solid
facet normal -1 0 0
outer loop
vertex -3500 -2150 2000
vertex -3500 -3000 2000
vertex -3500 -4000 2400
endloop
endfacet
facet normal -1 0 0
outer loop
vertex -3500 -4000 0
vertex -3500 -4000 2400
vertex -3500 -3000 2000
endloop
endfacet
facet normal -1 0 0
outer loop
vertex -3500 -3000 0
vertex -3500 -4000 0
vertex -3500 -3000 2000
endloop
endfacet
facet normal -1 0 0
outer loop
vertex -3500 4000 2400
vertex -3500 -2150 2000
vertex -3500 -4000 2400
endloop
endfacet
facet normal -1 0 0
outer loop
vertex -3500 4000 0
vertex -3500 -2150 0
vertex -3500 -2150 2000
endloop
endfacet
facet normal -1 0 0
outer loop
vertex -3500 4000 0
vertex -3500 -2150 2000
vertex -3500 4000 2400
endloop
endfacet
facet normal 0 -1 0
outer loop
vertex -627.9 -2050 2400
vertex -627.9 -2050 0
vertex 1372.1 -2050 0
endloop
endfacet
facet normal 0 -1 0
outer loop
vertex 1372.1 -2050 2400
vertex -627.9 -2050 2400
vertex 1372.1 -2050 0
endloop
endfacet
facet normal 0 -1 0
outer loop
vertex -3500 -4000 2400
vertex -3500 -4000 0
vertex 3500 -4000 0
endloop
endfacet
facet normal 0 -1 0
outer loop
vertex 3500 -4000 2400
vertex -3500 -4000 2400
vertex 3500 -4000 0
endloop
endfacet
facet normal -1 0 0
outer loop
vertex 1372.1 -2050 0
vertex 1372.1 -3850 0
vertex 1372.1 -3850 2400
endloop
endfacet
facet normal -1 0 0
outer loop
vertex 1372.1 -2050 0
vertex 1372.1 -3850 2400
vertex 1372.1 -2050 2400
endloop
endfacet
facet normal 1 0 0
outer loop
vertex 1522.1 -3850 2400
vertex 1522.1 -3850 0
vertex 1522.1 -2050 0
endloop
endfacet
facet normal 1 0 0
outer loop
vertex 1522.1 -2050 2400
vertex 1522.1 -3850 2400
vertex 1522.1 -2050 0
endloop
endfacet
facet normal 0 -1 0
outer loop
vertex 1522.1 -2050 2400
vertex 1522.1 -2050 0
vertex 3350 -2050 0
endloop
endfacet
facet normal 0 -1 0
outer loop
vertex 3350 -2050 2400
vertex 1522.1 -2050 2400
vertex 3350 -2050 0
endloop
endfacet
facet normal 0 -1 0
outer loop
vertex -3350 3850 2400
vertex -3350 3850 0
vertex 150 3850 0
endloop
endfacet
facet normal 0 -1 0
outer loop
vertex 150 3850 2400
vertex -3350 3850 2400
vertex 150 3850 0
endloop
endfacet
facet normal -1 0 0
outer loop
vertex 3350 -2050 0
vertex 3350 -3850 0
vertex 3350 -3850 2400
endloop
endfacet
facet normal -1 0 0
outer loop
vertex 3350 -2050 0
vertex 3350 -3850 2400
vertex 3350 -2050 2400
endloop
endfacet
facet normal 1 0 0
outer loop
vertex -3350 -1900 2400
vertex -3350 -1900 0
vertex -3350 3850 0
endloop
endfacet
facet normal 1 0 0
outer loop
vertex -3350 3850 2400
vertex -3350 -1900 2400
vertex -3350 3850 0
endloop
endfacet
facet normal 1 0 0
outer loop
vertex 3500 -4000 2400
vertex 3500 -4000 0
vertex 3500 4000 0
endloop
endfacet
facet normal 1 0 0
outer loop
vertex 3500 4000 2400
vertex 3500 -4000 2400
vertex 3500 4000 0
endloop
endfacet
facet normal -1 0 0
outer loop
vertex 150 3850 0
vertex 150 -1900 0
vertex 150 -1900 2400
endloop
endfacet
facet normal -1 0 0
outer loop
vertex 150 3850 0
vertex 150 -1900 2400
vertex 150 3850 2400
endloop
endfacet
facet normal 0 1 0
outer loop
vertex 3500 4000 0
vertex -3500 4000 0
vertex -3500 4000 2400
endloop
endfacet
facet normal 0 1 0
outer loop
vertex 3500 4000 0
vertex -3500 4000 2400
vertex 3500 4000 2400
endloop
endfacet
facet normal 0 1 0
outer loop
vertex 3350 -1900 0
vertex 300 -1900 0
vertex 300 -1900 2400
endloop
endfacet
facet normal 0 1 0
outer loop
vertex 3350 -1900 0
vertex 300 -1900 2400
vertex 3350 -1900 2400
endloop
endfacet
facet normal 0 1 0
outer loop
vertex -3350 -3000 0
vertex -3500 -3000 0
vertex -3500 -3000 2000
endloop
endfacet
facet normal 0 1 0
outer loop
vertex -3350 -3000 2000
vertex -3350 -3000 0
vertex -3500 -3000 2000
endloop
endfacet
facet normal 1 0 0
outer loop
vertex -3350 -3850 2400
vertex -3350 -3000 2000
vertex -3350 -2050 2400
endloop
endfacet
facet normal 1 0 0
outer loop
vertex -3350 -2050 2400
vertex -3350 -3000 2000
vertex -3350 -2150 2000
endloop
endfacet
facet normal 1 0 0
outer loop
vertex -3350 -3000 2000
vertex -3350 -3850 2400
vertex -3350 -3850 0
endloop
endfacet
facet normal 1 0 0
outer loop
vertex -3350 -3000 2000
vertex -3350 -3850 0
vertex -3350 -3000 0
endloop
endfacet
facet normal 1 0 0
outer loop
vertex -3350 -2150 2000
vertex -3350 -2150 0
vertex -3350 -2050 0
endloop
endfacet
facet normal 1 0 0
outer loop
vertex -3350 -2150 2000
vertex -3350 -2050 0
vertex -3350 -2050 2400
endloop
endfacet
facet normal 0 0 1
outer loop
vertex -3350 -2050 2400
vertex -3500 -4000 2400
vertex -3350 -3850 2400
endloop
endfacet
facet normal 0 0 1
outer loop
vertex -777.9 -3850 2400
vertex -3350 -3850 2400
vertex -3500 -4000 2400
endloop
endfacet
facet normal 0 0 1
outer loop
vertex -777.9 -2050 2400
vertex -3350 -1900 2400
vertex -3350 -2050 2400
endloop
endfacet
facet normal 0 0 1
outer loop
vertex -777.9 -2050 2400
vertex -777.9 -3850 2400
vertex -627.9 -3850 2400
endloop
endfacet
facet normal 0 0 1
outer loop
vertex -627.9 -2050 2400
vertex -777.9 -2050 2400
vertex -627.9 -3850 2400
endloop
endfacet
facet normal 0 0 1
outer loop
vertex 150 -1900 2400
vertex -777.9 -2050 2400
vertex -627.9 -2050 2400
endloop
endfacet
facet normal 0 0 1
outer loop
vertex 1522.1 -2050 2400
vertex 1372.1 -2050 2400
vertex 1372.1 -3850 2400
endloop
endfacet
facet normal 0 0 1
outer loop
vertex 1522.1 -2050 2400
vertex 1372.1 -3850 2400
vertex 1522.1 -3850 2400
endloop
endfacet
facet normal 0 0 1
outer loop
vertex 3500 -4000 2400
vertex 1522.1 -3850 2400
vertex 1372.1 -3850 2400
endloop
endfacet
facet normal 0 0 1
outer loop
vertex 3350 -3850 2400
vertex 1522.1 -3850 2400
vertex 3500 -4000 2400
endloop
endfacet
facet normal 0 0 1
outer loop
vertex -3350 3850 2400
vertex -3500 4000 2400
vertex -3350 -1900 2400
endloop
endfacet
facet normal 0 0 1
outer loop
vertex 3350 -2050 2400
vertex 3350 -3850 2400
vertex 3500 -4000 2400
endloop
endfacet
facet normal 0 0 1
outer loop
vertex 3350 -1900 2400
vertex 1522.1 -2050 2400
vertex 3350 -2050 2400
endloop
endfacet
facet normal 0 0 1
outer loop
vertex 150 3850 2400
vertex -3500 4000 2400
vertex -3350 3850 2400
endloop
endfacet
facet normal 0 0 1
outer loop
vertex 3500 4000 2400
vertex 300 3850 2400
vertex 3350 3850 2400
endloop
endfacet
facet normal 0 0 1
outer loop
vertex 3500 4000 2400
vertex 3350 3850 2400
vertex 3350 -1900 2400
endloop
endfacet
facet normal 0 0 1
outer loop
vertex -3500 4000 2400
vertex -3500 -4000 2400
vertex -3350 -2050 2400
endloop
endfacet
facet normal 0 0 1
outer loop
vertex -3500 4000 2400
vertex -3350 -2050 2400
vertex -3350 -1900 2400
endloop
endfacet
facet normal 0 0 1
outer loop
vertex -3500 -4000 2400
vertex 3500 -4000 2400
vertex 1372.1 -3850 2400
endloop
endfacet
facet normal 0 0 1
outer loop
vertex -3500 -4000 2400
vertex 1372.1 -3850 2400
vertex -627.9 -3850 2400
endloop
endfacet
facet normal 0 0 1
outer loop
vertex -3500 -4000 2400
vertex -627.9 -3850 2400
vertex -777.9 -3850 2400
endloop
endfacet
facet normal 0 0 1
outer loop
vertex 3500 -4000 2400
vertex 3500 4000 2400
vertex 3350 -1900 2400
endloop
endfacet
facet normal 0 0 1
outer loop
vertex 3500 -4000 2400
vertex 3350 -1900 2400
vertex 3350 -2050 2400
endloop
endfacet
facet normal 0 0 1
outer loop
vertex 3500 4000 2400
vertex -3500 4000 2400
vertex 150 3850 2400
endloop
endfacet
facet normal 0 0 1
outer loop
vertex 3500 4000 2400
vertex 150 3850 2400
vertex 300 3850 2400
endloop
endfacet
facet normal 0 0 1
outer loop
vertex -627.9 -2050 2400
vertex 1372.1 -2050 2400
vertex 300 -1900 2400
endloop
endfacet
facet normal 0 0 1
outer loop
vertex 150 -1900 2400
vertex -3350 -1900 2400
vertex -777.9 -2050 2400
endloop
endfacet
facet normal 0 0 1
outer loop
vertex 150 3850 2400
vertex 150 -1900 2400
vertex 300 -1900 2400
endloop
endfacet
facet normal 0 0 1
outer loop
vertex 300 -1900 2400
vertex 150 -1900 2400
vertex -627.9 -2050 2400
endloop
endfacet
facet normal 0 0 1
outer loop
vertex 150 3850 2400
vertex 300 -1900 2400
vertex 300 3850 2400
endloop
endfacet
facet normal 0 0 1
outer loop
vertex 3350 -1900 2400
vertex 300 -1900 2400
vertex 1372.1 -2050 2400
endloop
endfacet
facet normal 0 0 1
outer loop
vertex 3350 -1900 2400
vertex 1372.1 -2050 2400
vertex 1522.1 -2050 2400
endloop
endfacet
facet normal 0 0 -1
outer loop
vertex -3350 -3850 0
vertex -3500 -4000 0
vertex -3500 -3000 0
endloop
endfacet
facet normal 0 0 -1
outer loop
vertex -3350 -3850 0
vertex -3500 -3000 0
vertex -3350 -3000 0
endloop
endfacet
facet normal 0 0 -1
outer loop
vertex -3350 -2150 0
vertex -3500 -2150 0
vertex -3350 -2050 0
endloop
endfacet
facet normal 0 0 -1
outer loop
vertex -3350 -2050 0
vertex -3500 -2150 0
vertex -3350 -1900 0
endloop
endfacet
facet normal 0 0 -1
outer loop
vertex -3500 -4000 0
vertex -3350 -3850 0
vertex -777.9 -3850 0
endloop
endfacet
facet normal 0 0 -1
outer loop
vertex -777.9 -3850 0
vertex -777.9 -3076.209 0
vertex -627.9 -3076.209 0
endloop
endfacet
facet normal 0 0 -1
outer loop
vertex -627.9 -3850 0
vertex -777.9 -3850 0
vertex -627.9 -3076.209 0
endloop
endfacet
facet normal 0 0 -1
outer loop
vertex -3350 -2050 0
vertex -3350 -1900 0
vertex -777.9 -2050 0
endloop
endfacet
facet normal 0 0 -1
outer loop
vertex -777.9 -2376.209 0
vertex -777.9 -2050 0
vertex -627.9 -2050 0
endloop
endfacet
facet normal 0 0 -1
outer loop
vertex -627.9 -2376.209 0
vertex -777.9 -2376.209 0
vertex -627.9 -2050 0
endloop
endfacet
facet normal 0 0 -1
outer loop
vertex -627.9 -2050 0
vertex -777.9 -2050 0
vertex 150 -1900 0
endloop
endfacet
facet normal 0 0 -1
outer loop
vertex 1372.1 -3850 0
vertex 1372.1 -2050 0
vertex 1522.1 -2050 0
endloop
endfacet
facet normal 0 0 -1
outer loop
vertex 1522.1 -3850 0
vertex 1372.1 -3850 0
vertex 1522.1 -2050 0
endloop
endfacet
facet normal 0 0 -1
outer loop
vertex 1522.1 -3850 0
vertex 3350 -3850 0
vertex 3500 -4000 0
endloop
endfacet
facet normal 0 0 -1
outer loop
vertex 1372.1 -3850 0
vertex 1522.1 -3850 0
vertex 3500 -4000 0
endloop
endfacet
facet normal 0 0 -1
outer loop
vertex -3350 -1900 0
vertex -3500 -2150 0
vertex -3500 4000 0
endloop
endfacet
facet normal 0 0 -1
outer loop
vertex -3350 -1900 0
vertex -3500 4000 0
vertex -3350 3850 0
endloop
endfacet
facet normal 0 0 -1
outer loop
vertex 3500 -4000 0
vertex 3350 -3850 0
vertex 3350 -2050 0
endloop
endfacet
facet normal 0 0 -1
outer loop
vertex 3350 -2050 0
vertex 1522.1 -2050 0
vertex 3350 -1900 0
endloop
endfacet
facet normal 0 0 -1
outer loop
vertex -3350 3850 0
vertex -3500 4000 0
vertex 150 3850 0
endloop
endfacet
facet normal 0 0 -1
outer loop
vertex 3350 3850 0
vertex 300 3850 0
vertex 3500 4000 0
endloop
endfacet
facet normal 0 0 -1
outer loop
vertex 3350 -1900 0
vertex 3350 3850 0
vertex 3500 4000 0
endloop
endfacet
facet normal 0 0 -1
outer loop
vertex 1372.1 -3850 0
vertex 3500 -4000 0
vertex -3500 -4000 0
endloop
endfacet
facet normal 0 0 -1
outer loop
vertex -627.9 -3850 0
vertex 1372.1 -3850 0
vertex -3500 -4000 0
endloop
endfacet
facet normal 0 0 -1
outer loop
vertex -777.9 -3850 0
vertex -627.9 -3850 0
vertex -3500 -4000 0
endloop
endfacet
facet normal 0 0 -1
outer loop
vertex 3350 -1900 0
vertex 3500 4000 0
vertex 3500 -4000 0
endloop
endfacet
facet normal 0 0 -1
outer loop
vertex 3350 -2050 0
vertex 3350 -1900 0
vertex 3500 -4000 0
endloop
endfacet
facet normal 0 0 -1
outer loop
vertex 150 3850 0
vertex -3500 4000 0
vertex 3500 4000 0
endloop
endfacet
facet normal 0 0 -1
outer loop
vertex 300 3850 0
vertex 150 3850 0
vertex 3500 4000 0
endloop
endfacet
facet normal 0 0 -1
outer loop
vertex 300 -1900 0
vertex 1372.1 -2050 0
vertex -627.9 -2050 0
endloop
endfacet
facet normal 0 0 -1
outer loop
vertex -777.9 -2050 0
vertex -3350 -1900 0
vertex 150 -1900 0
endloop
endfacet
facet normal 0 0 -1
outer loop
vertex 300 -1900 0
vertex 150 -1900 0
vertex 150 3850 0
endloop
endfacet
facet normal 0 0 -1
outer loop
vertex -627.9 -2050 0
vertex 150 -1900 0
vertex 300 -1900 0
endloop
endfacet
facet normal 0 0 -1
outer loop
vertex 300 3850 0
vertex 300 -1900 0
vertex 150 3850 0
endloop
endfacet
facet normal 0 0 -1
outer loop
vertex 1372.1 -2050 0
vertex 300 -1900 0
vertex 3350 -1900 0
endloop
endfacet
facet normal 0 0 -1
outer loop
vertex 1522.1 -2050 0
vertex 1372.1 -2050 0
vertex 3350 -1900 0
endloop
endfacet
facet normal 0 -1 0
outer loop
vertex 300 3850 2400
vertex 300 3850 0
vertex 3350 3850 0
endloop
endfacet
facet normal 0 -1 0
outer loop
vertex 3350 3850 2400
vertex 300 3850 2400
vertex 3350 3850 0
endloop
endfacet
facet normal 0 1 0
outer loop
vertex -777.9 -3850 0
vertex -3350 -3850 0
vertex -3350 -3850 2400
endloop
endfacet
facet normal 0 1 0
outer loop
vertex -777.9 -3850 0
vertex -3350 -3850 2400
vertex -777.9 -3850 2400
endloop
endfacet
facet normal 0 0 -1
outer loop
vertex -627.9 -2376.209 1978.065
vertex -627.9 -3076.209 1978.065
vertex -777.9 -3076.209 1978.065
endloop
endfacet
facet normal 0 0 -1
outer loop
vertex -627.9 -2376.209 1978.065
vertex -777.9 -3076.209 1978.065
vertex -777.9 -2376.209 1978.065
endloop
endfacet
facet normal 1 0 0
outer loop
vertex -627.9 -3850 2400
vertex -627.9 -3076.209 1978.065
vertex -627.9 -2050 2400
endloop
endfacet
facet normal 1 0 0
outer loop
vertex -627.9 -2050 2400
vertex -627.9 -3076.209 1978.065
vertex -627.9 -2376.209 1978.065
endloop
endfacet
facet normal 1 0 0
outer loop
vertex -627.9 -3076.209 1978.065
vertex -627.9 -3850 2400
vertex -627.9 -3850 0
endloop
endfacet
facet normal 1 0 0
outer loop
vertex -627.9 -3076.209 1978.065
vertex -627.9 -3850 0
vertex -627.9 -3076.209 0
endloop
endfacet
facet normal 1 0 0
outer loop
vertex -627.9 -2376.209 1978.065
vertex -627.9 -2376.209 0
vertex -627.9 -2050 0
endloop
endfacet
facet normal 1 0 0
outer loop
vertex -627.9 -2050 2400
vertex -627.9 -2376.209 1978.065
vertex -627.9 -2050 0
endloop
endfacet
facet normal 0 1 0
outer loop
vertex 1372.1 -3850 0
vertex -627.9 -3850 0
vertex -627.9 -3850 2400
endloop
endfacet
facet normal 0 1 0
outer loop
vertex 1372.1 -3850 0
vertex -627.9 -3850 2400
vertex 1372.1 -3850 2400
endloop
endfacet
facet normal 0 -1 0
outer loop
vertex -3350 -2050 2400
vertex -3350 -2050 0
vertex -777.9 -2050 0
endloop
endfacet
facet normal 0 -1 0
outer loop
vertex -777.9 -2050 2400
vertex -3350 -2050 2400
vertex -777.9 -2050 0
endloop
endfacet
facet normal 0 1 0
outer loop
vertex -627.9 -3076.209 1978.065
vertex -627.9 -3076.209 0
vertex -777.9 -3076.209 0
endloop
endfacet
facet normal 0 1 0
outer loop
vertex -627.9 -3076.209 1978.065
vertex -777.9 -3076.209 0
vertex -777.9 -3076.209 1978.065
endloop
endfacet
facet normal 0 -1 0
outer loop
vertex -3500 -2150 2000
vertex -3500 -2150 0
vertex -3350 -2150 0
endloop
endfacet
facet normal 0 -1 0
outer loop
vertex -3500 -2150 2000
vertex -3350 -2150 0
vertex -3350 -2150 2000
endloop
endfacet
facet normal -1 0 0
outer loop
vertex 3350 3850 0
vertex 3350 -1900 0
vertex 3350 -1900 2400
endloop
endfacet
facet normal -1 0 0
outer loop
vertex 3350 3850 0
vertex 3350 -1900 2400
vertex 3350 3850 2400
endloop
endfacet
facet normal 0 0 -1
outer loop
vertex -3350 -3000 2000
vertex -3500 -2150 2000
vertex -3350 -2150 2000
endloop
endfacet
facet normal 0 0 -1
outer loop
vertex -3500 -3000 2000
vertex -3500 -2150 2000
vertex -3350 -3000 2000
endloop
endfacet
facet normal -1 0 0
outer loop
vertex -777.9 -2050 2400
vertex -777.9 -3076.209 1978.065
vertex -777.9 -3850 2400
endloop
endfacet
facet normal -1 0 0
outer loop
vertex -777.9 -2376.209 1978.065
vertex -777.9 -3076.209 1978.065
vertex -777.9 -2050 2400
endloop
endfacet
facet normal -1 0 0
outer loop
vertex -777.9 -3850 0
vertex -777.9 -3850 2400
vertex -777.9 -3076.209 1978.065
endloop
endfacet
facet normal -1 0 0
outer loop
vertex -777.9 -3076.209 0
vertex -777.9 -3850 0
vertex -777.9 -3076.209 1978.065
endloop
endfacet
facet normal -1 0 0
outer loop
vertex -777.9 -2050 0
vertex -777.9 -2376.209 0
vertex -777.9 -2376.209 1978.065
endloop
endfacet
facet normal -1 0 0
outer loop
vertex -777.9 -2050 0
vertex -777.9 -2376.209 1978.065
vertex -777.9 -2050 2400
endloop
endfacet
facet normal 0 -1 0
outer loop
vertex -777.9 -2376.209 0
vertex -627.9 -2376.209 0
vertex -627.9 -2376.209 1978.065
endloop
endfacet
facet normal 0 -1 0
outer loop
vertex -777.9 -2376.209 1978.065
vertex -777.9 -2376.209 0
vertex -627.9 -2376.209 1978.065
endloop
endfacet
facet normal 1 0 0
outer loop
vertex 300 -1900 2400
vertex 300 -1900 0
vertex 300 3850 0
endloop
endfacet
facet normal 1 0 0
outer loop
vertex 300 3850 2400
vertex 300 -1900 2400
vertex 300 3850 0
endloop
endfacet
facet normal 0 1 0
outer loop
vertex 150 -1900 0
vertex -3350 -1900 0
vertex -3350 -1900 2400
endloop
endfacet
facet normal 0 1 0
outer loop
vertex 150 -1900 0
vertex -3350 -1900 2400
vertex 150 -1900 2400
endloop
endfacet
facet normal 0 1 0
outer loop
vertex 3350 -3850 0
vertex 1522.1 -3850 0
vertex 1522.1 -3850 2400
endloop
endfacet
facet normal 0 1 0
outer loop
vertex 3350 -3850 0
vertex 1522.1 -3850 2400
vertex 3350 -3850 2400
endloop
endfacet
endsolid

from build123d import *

# Parameters (mm, degrees)
F0_W     = 7000
F0_H     = 8000
F0_W_2   = 2572.100198
F0_H_2   = 1800
F0_W_3   = 2000
F0_W_4   = 1827.899802
F0_W_5   = 3500
F0_H_3   = 5750
F0_W_6   = 3050
F1_DEPTH = 2400
F2_W     = 850
F2_H     = 2000
F3_DEPTH = 150
F4_W     = 700
F4_H     = 1978.064732
F5_DEPTH = 150


with BuildPart() as f1:
    # F0 (on Top) → F1 (new body)
    with BuildSketch(Plane.XY):
        Rectangle(F0_W, F0_H)
        with Locations((-2063.949901, -2950)):
            Rectangle(F0_W_2, F0_H_2, mode=Mode.SUBTRACT)
        with Locations((372.100198, -2950)):
            Rectangle(F0_W_3, F0_H_2, mode=Mode.SUBTRACT)
        with Locations((2436.050099, -2950)):
            Rectangle(F0_W_4, F0_H_2, mode=Mode.SUBTRACT)
        with Locations((-1600, 975)):
            Rectangle(F0_W_5, F0_H_3, mode=Mode.SUBTRACT)
        with Locations((1825, 975)):
            Rectangle(F0_W_6, F0_H_3, mode=Mode.SUBTRACT)
    extrude(amount=F1_DEPTH)

    # F2 (on face) → F3 (cut, through all)
    with BuildSketch(Plane(origin=(-3500, 0, 0), x_dir=(0, -1, 0), z_dir=(-1, 0, 0))):
        with Locations((2575, 1000)):
            Rectangle(F2_W, F2_H)
    extrude(amount=-F3_DEPTH, mode=Mode.SUBTRACT)

    # F4 (on face) → F5 (cut, through all)
    with BuildSketch(Plane.YZ.offset(-627.899802)):
        with Locations((-2726.209259, 989.032366)):
            Rectangle(F4_W, F4_H)
    extrude(amount=-F5_DEPTH, mode=Mode.SUBTRACT)


solid = f1.part
